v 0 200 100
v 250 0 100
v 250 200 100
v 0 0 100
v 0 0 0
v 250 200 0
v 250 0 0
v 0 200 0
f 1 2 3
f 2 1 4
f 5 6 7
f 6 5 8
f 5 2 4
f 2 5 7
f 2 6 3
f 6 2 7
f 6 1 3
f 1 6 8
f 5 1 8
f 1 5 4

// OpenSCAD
// file: param.scad
// This file is auto generated by cpp/src/main.cpp
// using user input

padLength = 200;
padWidth = 250;
padHeight = 100;
// main file
include <param.scad>;

cube([padWidth, padLength, padHeight]);
